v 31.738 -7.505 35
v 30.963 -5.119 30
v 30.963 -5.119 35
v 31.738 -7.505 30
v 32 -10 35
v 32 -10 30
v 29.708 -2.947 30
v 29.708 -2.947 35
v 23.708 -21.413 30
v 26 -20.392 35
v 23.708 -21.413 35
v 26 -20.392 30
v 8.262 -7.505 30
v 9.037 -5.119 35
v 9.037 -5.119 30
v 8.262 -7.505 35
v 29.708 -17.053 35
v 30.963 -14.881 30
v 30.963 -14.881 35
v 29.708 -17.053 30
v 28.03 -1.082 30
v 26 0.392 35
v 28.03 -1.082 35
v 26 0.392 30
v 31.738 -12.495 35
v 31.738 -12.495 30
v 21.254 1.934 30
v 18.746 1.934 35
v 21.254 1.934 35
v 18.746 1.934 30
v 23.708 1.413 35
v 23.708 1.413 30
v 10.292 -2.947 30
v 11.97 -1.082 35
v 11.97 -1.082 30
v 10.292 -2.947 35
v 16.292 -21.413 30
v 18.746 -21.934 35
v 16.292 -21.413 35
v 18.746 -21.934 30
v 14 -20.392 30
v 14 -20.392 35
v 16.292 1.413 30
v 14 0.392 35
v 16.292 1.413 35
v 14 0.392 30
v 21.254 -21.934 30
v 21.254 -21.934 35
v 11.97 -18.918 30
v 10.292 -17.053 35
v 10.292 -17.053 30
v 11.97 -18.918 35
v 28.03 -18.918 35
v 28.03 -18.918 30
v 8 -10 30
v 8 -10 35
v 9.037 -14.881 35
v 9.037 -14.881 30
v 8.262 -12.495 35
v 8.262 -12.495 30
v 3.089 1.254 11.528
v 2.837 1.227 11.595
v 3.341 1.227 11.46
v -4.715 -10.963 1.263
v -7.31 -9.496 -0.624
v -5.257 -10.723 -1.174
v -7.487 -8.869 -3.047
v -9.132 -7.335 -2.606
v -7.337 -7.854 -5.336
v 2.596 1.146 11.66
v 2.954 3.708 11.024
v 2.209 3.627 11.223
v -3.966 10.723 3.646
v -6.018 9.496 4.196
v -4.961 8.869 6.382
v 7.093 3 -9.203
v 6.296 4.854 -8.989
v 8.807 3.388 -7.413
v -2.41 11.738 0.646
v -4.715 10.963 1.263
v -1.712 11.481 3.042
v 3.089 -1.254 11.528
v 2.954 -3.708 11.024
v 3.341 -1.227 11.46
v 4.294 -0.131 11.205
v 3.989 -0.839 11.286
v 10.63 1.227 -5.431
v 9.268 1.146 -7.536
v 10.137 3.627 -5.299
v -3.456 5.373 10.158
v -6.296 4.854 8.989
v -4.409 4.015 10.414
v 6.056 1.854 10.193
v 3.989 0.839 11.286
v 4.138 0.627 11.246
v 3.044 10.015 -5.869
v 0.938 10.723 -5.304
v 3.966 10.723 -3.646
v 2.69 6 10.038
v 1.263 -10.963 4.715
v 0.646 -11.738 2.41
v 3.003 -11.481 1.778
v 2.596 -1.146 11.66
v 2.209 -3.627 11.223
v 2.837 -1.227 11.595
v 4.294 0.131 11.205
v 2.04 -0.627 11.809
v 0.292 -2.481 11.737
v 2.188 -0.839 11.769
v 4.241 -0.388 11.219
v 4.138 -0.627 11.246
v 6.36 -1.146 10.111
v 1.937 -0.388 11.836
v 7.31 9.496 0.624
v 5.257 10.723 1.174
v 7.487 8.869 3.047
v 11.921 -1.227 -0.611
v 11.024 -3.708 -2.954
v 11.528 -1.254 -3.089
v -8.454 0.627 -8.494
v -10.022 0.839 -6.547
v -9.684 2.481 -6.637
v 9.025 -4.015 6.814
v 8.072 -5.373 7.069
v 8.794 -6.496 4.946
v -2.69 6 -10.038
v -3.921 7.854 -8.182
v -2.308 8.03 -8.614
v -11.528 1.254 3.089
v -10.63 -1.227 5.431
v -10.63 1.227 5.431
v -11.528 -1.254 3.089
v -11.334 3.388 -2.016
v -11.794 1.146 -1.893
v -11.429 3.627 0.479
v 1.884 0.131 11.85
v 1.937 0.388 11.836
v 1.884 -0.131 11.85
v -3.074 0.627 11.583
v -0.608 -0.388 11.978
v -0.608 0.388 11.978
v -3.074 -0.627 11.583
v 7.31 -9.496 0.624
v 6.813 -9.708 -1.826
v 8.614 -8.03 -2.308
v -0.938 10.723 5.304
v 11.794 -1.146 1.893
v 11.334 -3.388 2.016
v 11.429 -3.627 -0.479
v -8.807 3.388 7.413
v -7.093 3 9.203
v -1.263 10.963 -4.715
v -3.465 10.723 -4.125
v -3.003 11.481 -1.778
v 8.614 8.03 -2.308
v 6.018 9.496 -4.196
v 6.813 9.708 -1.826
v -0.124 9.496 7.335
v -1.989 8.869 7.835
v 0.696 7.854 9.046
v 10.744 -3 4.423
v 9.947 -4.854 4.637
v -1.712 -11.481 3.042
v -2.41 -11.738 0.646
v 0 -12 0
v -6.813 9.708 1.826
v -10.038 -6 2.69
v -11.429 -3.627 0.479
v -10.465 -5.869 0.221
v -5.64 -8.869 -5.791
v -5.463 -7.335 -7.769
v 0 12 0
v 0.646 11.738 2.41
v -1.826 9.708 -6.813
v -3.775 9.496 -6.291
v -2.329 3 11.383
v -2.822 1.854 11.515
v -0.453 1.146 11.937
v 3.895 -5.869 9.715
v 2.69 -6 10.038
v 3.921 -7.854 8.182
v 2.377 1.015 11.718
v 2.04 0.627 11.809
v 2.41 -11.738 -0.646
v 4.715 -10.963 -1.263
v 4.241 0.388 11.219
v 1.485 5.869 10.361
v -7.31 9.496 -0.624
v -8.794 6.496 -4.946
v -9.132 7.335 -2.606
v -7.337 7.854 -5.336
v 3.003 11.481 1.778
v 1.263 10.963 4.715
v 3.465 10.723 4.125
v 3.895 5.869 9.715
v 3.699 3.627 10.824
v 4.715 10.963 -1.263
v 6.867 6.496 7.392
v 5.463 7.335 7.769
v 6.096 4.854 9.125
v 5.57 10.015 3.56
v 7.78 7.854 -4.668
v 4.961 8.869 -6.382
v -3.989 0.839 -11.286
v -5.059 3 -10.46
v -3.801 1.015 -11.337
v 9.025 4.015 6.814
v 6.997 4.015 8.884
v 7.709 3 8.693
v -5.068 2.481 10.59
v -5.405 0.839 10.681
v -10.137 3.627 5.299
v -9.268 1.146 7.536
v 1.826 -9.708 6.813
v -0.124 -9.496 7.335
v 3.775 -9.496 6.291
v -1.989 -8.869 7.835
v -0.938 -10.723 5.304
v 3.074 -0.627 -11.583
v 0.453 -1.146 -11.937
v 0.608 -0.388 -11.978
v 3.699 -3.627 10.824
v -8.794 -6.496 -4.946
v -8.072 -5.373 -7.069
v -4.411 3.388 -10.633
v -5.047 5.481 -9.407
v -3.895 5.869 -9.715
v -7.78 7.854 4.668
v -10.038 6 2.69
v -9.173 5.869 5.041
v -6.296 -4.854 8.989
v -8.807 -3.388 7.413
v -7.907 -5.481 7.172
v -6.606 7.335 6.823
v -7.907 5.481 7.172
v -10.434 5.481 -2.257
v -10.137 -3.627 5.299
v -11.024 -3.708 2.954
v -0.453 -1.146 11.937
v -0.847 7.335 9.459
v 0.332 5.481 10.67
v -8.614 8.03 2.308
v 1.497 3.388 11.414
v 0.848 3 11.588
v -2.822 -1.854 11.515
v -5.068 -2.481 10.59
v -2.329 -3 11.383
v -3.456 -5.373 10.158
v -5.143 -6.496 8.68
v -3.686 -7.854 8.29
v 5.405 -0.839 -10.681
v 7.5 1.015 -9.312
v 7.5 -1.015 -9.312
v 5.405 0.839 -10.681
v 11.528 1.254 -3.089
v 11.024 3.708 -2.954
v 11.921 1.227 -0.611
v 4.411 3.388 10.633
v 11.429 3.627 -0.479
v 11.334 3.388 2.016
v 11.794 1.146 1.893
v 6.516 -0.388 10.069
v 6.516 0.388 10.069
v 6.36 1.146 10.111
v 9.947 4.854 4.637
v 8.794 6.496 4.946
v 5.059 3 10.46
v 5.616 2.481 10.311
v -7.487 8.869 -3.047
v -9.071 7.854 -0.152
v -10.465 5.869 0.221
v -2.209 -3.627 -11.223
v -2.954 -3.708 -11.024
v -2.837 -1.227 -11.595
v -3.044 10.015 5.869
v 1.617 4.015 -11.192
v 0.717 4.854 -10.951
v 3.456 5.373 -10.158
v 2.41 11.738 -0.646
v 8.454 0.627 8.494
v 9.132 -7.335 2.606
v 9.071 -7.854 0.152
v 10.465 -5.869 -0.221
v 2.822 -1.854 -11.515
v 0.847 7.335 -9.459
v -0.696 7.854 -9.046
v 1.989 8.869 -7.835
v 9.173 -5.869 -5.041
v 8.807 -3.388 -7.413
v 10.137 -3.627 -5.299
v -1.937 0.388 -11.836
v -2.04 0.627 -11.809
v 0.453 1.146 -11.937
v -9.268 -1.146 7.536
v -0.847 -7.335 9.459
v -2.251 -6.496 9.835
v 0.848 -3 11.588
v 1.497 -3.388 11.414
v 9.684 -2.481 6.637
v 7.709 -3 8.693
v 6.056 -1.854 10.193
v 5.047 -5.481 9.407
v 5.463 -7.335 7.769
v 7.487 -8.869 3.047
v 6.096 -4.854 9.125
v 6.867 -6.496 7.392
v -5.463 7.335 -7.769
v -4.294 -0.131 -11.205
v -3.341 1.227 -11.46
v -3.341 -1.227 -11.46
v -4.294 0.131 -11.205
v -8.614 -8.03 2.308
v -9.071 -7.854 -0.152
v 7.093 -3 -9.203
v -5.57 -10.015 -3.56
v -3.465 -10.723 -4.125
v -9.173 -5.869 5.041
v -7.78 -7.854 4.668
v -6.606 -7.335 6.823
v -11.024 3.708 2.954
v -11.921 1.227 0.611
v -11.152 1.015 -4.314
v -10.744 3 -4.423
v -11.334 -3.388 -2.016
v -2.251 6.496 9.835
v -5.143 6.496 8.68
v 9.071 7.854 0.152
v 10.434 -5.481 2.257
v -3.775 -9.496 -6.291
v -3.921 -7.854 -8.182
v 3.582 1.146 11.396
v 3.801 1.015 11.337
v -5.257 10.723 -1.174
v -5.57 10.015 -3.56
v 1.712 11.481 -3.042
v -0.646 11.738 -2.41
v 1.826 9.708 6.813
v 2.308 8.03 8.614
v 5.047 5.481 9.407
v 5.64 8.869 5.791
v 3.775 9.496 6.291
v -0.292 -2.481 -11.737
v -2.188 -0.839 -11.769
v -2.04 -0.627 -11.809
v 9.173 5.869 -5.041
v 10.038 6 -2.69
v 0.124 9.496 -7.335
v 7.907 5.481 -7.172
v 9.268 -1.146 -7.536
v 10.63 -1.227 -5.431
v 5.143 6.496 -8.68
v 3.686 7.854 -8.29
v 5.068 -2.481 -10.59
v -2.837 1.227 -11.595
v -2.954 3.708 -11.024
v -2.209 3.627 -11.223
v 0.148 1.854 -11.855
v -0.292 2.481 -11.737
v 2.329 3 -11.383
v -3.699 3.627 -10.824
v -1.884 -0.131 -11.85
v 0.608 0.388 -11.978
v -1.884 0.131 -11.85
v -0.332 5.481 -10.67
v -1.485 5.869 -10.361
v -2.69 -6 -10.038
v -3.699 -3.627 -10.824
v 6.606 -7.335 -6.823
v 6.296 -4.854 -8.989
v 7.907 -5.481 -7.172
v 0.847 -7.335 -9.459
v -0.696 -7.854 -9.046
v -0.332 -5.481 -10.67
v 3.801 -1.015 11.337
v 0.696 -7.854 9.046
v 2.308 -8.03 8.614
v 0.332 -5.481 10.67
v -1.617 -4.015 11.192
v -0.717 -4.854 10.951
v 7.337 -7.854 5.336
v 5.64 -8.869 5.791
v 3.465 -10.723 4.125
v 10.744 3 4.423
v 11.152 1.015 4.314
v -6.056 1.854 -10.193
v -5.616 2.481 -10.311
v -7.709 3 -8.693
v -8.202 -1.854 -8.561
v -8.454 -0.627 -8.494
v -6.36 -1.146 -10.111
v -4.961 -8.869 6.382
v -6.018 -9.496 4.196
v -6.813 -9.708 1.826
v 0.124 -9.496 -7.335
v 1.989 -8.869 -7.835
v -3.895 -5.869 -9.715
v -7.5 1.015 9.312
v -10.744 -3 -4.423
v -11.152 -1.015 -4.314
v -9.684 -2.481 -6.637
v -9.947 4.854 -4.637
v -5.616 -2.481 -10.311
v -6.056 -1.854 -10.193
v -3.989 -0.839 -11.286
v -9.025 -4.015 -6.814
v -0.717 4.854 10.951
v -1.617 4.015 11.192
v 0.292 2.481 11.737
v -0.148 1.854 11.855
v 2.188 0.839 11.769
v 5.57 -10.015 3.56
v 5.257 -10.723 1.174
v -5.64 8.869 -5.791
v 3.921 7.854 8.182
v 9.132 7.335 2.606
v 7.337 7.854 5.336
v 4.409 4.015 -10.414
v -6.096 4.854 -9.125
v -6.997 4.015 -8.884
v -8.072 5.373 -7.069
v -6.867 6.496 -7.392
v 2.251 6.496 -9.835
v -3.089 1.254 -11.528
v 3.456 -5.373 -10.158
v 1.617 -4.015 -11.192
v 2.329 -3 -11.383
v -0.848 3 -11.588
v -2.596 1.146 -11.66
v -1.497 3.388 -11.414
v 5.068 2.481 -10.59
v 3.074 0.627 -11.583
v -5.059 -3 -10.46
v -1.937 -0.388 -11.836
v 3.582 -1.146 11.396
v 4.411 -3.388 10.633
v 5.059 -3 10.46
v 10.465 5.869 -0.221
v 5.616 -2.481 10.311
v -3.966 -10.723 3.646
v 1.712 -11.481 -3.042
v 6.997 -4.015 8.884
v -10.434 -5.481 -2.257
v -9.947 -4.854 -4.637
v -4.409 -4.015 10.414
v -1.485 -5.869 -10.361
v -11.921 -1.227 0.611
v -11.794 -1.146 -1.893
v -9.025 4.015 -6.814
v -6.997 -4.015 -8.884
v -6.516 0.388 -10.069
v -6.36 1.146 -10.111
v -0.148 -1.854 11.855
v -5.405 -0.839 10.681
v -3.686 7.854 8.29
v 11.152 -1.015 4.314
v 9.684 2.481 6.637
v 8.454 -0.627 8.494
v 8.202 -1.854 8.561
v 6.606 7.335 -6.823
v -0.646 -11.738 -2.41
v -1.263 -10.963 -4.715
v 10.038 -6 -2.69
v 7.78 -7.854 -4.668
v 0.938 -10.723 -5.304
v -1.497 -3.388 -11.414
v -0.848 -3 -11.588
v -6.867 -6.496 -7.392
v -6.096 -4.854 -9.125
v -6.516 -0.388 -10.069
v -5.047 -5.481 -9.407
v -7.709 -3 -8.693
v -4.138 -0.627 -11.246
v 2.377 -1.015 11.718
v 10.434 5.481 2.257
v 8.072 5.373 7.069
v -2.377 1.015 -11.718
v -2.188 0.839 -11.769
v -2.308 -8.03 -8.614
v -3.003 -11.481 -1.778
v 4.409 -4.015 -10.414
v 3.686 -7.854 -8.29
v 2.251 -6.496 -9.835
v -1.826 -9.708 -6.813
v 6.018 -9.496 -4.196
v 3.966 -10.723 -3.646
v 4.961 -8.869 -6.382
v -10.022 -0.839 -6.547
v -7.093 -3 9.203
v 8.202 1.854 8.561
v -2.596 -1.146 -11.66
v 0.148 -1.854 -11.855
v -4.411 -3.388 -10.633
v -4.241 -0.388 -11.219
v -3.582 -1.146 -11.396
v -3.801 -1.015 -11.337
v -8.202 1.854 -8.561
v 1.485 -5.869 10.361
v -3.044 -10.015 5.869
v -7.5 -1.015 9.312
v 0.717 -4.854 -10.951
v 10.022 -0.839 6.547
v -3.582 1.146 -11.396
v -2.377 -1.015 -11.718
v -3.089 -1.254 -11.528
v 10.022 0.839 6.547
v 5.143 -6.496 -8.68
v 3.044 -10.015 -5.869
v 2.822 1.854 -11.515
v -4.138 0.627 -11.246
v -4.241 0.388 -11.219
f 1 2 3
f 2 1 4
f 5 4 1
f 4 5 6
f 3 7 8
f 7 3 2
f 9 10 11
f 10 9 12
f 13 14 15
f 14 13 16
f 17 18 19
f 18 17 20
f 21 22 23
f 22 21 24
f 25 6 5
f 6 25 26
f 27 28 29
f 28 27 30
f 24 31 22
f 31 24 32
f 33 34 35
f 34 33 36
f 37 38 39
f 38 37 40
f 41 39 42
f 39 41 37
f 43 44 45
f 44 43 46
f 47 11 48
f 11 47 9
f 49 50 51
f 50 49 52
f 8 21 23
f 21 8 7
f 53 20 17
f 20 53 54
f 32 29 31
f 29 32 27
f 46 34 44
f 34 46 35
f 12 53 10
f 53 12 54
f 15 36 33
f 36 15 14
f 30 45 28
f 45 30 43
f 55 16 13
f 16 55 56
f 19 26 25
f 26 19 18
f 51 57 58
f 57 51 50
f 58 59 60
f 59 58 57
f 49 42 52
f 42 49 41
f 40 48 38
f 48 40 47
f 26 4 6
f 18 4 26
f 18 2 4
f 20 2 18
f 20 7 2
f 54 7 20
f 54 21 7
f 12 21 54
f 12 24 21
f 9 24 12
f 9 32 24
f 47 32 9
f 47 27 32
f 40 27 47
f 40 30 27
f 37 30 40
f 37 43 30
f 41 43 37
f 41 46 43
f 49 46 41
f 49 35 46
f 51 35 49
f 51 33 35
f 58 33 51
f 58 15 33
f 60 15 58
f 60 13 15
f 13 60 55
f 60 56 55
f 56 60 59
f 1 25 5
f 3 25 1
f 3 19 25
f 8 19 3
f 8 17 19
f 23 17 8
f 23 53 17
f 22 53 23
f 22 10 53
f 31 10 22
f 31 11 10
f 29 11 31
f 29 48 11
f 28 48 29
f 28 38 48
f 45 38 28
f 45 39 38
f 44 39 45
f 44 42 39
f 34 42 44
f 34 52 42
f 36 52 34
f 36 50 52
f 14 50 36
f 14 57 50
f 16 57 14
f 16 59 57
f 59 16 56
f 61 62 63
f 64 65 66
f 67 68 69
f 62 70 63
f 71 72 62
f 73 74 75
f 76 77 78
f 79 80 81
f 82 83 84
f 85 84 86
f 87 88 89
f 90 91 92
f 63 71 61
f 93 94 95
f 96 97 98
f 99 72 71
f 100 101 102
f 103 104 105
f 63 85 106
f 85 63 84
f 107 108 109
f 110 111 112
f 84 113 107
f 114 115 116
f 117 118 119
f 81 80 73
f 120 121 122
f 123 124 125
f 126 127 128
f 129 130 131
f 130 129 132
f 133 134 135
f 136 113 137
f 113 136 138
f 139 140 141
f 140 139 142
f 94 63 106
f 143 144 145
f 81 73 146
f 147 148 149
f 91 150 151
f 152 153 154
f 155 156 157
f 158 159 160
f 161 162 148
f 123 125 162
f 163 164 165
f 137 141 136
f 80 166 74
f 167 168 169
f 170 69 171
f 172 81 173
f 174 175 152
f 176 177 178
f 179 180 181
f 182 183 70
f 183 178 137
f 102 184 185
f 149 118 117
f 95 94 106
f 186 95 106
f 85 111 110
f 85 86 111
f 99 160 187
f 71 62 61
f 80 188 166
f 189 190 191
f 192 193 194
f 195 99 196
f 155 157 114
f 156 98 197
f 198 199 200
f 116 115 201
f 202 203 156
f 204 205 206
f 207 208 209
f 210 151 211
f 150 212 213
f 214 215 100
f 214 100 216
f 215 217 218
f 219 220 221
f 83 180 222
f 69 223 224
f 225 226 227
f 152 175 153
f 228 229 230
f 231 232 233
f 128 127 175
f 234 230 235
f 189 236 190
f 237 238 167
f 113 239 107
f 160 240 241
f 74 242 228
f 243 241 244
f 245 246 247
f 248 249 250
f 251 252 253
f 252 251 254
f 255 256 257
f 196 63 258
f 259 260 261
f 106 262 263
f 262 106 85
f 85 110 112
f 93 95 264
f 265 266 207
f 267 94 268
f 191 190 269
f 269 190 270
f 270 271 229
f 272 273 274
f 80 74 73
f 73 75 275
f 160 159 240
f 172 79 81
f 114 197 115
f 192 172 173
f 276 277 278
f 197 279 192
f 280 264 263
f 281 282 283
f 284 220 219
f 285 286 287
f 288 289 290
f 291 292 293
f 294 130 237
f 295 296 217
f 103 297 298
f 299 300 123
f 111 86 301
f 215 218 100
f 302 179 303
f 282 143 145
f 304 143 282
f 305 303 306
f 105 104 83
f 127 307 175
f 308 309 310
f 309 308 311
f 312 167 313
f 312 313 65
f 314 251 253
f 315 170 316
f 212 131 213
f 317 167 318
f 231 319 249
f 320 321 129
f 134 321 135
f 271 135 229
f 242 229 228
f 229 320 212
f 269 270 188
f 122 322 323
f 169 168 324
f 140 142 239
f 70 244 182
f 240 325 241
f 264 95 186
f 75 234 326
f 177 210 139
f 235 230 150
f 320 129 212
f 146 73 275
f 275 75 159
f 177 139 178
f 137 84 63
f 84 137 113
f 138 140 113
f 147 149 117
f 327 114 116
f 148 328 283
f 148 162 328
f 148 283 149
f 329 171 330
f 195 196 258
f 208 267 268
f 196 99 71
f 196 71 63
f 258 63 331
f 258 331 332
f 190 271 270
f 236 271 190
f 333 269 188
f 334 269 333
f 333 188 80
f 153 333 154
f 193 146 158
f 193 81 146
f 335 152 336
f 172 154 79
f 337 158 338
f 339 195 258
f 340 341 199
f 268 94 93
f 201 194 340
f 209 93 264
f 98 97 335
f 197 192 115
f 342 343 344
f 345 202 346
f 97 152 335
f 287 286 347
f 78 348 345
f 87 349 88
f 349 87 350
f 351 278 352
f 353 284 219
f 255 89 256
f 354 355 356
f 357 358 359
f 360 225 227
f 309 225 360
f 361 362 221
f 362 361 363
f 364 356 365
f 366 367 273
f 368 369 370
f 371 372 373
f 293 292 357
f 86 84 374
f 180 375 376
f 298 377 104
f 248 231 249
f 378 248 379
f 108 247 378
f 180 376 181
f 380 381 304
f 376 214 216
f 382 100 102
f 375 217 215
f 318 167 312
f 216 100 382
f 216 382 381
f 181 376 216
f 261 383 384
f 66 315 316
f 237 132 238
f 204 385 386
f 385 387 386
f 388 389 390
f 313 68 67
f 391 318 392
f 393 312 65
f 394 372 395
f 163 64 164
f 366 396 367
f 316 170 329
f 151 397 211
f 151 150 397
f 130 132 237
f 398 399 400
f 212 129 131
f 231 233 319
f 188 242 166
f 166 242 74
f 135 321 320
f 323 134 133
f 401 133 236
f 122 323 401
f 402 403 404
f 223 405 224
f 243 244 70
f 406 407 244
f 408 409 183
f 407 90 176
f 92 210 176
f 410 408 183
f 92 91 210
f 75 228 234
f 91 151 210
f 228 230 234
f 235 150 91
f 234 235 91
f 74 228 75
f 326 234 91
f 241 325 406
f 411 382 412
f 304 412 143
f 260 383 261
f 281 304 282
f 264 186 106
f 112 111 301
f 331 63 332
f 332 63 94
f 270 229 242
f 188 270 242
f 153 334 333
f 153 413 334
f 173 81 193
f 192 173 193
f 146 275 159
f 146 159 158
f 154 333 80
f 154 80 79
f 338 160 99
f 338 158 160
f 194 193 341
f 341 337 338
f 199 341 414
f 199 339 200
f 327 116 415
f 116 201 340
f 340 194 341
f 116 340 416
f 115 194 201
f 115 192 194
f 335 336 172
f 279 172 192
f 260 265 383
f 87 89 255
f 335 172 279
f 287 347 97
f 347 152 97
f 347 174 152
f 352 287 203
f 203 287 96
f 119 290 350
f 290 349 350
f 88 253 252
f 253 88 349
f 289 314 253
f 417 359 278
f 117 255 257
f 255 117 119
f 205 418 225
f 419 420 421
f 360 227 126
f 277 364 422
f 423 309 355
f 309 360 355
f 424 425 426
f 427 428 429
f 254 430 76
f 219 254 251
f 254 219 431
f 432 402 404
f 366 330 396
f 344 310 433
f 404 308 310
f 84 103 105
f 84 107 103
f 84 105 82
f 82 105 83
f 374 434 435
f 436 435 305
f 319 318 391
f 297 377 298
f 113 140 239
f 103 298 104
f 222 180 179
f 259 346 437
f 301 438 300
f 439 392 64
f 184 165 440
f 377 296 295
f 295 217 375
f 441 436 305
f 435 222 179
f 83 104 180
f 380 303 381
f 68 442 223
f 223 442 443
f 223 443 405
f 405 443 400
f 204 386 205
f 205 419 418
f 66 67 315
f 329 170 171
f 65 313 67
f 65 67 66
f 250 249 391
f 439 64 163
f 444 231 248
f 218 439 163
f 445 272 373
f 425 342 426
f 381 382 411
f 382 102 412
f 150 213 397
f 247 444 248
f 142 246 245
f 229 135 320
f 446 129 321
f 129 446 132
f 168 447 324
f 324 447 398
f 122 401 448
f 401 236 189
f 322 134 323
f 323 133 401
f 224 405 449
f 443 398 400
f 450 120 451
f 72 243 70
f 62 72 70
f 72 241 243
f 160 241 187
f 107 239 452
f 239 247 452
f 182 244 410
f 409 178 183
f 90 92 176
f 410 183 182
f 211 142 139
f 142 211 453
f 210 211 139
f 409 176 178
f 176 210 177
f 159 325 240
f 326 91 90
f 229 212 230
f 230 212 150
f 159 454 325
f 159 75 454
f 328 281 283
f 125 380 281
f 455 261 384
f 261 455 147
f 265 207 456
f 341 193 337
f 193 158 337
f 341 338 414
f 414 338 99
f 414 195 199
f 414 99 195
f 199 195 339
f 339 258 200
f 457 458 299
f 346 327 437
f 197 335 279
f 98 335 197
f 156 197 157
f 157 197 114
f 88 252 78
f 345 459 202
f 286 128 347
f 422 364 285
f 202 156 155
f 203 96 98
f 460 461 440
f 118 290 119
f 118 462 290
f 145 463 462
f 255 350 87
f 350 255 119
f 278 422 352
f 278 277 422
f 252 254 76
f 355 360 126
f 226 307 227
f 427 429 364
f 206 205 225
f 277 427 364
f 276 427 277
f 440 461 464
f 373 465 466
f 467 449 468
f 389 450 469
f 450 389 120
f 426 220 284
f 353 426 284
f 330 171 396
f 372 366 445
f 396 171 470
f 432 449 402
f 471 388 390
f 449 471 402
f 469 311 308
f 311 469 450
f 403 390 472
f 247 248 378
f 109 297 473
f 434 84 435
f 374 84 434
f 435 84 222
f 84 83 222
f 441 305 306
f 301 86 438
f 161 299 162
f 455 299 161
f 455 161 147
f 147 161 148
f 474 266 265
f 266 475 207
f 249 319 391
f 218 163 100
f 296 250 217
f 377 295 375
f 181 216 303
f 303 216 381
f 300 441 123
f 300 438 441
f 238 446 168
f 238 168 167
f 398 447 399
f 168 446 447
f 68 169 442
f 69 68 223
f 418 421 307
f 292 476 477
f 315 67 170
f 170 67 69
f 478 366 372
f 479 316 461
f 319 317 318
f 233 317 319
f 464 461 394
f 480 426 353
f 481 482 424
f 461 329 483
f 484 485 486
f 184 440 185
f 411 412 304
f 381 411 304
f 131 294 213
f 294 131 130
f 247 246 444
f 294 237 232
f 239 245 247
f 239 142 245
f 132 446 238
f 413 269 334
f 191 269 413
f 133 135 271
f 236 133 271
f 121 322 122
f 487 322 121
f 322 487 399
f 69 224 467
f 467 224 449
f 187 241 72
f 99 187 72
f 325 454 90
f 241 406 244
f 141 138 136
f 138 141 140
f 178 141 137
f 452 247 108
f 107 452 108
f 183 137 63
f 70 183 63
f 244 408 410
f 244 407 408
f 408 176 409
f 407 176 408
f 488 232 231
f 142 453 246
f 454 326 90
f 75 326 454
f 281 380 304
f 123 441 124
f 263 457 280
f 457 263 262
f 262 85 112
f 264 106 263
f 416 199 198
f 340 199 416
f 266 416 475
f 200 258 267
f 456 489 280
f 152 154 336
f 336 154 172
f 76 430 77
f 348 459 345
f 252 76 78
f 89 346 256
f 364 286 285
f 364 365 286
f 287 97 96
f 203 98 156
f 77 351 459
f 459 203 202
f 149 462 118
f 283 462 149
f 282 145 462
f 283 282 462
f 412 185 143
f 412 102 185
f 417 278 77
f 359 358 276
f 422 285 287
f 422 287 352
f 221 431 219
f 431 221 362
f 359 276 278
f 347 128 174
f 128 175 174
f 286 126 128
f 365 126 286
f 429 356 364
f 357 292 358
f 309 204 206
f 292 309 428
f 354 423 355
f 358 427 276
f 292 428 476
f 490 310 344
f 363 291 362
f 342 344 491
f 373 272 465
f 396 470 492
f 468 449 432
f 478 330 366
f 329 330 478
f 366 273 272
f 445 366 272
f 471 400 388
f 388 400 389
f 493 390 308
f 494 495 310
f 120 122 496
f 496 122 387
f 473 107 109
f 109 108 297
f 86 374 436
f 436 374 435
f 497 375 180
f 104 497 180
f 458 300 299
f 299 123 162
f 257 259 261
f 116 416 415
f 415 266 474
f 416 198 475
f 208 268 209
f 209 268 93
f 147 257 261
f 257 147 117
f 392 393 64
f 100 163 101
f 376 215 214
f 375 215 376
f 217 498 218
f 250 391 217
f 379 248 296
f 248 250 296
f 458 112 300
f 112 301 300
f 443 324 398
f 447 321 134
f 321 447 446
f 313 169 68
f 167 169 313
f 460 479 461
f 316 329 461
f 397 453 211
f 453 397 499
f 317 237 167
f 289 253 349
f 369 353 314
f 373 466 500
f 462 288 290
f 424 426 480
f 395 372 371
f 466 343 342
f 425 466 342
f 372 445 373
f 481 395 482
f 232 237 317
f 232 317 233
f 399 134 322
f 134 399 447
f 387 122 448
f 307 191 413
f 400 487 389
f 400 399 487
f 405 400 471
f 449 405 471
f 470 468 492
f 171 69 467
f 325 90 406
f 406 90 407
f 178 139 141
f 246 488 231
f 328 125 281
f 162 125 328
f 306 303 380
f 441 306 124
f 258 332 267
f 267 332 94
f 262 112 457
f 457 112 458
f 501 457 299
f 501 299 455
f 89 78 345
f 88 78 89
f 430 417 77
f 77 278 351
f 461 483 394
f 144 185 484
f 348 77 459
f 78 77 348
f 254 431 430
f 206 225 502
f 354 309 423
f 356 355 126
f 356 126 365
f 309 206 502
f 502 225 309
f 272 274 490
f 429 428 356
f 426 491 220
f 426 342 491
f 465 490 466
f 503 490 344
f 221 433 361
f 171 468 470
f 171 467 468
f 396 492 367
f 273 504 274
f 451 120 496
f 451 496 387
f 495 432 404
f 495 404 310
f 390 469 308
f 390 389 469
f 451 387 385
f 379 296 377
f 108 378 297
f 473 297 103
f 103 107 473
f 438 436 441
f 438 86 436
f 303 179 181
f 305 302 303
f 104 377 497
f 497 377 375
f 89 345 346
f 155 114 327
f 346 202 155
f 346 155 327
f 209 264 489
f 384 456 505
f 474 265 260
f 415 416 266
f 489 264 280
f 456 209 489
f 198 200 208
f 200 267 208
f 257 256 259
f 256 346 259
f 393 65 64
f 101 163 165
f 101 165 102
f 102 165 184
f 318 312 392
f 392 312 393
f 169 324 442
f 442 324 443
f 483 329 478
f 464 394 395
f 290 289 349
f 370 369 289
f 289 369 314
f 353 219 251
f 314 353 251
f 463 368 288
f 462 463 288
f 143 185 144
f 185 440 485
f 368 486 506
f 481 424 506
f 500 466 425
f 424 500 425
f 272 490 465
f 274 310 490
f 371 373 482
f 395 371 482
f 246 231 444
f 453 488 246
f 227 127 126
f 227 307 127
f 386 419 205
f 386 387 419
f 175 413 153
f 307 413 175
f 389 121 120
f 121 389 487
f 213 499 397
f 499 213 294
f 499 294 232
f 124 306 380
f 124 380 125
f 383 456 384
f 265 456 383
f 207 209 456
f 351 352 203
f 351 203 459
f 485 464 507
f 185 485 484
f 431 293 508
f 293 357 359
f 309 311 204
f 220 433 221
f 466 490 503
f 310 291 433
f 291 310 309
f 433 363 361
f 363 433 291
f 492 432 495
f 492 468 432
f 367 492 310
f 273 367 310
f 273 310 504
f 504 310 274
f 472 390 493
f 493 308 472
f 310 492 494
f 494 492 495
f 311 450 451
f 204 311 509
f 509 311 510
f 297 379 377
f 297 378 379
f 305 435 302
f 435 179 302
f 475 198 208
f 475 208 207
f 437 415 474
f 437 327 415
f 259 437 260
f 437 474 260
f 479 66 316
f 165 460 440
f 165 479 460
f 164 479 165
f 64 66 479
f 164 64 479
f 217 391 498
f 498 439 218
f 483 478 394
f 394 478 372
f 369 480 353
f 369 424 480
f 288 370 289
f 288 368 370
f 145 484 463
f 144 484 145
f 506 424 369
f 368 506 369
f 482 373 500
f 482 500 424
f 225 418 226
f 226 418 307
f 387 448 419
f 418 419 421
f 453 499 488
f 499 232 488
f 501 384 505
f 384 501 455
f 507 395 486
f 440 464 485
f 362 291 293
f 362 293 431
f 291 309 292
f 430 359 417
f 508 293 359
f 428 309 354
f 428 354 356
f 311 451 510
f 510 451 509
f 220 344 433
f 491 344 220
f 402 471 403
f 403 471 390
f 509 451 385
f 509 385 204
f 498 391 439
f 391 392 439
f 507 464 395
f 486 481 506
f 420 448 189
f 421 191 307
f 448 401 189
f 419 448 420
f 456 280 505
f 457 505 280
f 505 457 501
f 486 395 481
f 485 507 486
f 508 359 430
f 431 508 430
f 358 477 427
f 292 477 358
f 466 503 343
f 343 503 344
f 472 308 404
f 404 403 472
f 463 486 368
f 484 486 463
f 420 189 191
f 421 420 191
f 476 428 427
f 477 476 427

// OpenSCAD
// Generated by generate_scads.py
union() {
  translate([20,-10,30]) {
    cylinder(h=5, r=12, center=false);
  }
  rotate([15,0,90]) {
    sphere(r=12);
  }
}
